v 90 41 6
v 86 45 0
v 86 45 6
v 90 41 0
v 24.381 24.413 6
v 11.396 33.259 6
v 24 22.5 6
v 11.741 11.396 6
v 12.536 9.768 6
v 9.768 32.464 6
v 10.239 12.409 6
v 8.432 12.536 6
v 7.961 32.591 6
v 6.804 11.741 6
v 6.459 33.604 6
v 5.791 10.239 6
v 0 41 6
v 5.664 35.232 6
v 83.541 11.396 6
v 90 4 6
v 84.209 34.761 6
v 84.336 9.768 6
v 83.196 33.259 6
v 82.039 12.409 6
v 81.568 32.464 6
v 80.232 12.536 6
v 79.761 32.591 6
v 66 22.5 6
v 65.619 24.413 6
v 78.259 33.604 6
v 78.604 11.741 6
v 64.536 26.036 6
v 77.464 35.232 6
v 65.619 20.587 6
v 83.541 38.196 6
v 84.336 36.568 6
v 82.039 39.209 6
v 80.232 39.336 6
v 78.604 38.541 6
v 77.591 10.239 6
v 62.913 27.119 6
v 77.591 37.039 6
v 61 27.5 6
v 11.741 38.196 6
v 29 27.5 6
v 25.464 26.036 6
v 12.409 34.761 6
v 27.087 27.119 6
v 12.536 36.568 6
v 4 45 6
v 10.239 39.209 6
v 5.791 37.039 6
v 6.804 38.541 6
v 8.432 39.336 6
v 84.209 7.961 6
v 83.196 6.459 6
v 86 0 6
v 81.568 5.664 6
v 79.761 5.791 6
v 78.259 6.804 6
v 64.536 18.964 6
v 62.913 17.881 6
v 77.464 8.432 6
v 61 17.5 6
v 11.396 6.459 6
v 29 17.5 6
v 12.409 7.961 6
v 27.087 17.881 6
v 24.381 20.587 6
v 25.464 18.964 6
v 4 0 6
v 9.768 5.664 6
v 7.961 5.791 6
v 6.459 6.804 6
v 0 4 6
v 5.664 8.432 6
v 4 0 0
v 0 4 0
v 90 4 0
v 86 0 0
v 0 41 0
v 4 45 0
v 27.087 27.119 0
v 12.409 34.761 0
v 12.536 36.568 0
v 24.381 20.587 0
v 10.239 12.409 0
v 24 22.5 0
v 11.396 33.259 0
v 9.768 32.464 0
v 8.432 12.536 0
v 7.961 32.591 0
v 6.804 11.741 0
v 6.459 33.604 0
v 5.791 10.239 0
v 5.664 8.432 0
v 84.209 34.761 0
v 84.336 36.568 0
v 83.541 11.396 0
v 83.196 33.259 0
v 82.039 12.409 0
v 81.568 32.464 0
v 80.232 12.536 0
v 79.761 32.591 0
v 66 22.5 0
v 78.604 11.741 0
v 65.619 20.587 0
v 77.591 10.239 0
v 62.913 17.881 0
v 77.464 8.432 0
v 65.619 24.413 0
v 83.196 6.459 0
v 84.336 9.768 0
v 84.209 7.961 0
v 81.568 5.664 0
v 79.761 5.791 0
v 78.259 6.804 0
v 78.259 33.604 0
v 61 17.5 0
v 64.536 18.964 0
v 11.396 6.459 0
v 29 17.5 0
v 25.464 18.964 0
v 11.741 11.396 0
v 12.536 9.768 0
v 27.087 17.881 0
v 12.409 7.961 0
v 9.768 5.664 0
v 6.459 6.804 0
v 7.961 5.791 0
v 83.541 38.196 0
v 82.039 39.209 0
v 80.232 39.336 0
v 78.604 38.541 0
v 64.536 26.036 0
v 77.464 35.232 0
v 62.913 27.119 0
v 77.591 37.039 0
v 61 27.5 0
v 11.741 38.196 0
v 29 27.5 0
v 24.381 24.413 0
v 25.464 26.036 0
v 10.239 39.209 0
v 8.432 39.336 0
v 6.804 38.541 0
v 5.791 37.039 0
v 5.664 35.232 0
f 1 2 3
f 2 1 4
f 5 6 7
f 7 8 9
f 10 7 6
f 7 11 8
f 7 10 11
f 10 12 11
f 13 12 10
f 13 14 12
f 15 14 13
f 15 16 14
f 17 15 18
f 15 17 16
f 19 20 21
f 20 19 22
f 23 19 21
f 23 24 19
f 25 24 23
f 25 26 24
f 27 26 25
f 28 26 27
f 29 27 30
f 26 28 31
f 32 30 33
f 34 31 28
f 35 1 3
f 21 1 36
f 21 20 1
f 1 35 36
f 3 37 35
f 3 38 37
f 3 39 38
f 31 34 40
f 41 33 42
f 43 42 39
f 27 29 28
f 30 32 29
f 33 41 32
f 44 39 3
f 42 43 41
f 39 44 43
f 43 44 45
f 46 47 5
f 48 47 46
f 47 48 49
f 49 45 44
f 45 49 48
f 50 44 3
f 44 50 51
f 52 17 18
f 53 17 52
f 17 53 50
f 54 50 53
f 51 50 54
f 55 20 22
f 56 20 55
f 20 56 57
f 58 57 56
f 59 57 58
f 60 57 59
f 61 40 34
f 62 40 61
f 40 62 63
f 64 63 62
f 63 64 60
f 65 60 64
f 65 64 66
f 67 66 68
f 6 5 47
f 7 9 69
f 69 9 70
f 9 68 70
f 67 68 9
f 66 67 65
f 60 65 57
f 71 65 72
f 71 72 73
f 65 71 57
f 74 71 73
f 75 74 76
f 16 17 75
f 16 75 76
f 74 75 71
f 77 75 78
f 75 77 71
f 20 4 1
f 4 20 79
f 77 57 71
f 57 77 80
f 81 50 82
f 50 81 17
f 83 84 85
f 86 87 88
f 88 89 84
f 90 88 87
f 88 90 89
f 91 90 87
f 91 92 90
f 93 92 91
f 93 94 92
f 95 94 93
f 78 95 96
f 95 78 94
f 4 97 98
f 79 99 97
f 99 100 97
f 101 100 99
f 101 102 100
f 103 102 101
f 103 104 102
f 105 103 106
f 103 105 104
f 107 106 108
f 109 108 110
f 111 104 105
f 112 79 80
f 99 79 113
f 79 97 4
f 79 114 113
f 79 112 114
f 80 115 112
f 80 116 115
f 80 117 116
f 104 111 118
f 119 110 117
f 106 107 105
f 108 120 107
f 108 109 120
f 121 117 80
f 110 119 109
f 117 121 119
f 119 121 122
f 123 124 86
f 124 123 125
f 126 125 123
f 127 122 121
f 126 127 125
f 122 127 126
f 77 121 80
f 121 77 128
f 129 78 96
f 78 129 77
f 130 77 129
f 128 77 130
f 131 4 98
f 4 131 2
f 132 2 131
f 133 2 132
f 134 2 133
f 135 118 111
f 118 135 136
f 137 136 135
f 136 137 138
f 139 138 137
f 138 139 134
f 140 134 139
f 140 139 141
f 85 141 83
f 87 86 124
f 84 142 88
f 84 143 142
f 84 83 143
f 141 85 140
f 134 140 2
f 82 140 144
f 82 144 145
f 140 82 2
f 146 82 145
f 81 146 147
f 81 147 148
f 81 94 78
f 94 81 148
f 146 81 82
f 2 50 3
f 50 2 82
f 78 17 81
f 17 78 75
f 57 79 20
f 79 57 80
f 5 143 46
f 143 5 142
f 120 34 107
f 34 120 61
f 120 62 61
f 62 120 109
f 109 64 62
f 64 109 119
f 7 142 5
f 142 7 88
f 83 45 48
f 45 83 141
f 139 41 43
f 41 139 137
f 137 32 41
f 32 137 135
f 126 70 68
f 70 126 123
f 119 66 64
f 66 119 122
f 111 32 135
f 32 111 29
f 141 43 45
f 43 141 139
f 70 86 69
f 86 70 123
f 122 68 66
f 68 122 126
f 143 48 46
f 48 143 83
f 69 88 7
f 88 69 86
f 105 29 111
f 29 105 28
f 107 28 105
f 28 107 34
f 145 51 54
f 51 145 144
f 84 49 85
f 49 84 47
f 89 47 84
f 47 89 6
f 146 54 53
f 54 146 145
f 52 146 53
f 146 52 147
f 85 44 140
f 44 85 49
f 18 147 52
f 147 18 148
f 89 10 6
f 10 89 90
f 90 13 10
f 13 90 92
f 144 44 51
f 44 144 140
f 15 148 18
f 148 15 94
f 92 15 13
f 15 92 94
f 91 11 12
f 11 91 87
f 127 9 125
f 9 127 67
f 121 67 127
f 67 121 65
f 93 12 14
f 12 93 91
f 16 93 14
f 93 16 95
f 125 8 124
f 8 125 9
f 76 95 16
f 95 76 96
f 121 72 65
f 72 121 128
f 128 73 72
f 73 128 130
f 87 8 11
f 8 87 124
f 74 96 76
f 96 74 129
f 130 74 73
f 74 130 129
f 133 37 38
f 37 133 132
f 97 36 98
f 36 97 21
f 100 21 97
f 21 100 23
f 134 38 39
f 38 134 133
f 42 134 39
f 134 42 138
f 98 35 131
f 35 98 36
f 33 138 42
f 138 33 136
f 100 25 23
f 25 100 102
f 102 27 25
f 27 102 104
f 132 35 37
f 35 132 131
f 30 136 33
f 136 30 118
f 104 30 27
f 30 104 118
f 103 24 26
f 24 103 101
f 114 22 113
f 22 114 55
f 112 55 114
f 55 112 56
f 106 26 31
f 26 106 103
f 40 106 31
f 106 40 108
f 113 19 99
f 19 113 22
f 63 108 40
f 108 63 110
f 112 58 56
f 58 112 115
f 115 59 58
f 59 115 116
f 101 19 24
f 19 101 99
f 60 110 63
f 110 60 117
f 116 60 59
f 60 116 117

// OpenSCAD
$fn = 32;

// ----------------------------------------------------------------------
// Bracket plate: slot plate 90 x 45
// ----------------------------------------------------------------------

// --- parameters (mm) ---
hole_r = 3.5;             // bolt hole radius
plate_t = 6;              // plate thickness, Z (extrusion height)
plate_l = 90;             // plate length
plate_w = 45;             // plate width
slot_l = 32;              // slot straight length
slot_r = 5;               // slot end radius

slot_len = slot_l + 2 * slot_r;
slot_w = 2 * slot_r;
hole_d2 = 2 * hole_r;

profile = [[4, 0], [86, 0], [90, 4], [90, 41], [86, 45], [4, 45], [0, 41], [0, 4]];  // primary outline, 8 points, counter clockwise
void_1 = [[61, 17.5], [62.913, 17.881], [64.536, 18.964], [65.619, 20.587], [66, 22.5], [65.619, 24.413], [64.536, 26.036], [62.913, 27.119], [61, 27.5], [29, 27.5], [27.087, 27.119], [25.464, 26.036], [24.381, 24.413], [24, 22.5], [24.381, 20.587], [25.464, 18.964], [27.087, 17.881], [29, 17.5]];  // grip slot, 18 points
void_2 = [[12.536, 36.568], [11.741, 38.196], [10.239, 39.209], [8.432, 39.336], [6.804, 38.541], [5.791, 37.039], [5.664, 35.232], [6.459, 33.604], [7.961, 32.591], [9.768, 32.464], [11.396, 33.259], [12.409, 34.761]];  // corner hole, 12 points
void_3 = [[12.536, 9.768], [11.741, 11.396], [10.239, 12.409], [8.432, 12.536], [6.804, 11.741], [5.791, 10.239], [5.664, 8.432], [6.459, 6.804], [7.961, 5.791], [9.768, 5.664], [11.396, 6.459], [12.409, 7.961]];  // corner hole, 12 points
void_4 = [[84.336, 36.568], [83.541, 38.196], [82.039, 39.209], [80.232, 39.336], [78.604, 38.541], [77.591, 37.039], [77.464, 35.232], [78.259, 33.604], [79.761, 32.591], [81.568, 32.464], [83.196, 33.259], [84.209, 34.761]];  // corner hole, 12 points
void_5 = [[84.336, 9.768], [83.541, 11.396], [82.039, 12.409], [80.232, 12.536], [78.604, 11.741], [77.591, 10.239], [77.464, 8.432], [78.259, 6.804], [79.761, 5.791], [81.568, 5.664], [83.196, 6.459], [84.209, 7.961]];  // corner hole, 12 points

// --- the one profile operation ---
difference() {
  linear_extrude(height = plate_t) polygon(points = profile);
  translate([0, 0, -1])
    linear_extrude(height = plate_t + 2) polygon(points = void_1);
  translate([0, 0, -1])
    linear_extrude(height = plate_t + 2) polygon(points = void_2);
  translate([0, 0, -1])
    linear_extrude(height = plate_t + 2) polygon(points = void_3);
  translate([0, 0, -1])
    linear_extrude(height = plate_t + 2) polygon(points = void_4);
  translate([0, 0, -1])
    linear_extrude(height = plate_t + 2) polygon(points = void_5);
}
